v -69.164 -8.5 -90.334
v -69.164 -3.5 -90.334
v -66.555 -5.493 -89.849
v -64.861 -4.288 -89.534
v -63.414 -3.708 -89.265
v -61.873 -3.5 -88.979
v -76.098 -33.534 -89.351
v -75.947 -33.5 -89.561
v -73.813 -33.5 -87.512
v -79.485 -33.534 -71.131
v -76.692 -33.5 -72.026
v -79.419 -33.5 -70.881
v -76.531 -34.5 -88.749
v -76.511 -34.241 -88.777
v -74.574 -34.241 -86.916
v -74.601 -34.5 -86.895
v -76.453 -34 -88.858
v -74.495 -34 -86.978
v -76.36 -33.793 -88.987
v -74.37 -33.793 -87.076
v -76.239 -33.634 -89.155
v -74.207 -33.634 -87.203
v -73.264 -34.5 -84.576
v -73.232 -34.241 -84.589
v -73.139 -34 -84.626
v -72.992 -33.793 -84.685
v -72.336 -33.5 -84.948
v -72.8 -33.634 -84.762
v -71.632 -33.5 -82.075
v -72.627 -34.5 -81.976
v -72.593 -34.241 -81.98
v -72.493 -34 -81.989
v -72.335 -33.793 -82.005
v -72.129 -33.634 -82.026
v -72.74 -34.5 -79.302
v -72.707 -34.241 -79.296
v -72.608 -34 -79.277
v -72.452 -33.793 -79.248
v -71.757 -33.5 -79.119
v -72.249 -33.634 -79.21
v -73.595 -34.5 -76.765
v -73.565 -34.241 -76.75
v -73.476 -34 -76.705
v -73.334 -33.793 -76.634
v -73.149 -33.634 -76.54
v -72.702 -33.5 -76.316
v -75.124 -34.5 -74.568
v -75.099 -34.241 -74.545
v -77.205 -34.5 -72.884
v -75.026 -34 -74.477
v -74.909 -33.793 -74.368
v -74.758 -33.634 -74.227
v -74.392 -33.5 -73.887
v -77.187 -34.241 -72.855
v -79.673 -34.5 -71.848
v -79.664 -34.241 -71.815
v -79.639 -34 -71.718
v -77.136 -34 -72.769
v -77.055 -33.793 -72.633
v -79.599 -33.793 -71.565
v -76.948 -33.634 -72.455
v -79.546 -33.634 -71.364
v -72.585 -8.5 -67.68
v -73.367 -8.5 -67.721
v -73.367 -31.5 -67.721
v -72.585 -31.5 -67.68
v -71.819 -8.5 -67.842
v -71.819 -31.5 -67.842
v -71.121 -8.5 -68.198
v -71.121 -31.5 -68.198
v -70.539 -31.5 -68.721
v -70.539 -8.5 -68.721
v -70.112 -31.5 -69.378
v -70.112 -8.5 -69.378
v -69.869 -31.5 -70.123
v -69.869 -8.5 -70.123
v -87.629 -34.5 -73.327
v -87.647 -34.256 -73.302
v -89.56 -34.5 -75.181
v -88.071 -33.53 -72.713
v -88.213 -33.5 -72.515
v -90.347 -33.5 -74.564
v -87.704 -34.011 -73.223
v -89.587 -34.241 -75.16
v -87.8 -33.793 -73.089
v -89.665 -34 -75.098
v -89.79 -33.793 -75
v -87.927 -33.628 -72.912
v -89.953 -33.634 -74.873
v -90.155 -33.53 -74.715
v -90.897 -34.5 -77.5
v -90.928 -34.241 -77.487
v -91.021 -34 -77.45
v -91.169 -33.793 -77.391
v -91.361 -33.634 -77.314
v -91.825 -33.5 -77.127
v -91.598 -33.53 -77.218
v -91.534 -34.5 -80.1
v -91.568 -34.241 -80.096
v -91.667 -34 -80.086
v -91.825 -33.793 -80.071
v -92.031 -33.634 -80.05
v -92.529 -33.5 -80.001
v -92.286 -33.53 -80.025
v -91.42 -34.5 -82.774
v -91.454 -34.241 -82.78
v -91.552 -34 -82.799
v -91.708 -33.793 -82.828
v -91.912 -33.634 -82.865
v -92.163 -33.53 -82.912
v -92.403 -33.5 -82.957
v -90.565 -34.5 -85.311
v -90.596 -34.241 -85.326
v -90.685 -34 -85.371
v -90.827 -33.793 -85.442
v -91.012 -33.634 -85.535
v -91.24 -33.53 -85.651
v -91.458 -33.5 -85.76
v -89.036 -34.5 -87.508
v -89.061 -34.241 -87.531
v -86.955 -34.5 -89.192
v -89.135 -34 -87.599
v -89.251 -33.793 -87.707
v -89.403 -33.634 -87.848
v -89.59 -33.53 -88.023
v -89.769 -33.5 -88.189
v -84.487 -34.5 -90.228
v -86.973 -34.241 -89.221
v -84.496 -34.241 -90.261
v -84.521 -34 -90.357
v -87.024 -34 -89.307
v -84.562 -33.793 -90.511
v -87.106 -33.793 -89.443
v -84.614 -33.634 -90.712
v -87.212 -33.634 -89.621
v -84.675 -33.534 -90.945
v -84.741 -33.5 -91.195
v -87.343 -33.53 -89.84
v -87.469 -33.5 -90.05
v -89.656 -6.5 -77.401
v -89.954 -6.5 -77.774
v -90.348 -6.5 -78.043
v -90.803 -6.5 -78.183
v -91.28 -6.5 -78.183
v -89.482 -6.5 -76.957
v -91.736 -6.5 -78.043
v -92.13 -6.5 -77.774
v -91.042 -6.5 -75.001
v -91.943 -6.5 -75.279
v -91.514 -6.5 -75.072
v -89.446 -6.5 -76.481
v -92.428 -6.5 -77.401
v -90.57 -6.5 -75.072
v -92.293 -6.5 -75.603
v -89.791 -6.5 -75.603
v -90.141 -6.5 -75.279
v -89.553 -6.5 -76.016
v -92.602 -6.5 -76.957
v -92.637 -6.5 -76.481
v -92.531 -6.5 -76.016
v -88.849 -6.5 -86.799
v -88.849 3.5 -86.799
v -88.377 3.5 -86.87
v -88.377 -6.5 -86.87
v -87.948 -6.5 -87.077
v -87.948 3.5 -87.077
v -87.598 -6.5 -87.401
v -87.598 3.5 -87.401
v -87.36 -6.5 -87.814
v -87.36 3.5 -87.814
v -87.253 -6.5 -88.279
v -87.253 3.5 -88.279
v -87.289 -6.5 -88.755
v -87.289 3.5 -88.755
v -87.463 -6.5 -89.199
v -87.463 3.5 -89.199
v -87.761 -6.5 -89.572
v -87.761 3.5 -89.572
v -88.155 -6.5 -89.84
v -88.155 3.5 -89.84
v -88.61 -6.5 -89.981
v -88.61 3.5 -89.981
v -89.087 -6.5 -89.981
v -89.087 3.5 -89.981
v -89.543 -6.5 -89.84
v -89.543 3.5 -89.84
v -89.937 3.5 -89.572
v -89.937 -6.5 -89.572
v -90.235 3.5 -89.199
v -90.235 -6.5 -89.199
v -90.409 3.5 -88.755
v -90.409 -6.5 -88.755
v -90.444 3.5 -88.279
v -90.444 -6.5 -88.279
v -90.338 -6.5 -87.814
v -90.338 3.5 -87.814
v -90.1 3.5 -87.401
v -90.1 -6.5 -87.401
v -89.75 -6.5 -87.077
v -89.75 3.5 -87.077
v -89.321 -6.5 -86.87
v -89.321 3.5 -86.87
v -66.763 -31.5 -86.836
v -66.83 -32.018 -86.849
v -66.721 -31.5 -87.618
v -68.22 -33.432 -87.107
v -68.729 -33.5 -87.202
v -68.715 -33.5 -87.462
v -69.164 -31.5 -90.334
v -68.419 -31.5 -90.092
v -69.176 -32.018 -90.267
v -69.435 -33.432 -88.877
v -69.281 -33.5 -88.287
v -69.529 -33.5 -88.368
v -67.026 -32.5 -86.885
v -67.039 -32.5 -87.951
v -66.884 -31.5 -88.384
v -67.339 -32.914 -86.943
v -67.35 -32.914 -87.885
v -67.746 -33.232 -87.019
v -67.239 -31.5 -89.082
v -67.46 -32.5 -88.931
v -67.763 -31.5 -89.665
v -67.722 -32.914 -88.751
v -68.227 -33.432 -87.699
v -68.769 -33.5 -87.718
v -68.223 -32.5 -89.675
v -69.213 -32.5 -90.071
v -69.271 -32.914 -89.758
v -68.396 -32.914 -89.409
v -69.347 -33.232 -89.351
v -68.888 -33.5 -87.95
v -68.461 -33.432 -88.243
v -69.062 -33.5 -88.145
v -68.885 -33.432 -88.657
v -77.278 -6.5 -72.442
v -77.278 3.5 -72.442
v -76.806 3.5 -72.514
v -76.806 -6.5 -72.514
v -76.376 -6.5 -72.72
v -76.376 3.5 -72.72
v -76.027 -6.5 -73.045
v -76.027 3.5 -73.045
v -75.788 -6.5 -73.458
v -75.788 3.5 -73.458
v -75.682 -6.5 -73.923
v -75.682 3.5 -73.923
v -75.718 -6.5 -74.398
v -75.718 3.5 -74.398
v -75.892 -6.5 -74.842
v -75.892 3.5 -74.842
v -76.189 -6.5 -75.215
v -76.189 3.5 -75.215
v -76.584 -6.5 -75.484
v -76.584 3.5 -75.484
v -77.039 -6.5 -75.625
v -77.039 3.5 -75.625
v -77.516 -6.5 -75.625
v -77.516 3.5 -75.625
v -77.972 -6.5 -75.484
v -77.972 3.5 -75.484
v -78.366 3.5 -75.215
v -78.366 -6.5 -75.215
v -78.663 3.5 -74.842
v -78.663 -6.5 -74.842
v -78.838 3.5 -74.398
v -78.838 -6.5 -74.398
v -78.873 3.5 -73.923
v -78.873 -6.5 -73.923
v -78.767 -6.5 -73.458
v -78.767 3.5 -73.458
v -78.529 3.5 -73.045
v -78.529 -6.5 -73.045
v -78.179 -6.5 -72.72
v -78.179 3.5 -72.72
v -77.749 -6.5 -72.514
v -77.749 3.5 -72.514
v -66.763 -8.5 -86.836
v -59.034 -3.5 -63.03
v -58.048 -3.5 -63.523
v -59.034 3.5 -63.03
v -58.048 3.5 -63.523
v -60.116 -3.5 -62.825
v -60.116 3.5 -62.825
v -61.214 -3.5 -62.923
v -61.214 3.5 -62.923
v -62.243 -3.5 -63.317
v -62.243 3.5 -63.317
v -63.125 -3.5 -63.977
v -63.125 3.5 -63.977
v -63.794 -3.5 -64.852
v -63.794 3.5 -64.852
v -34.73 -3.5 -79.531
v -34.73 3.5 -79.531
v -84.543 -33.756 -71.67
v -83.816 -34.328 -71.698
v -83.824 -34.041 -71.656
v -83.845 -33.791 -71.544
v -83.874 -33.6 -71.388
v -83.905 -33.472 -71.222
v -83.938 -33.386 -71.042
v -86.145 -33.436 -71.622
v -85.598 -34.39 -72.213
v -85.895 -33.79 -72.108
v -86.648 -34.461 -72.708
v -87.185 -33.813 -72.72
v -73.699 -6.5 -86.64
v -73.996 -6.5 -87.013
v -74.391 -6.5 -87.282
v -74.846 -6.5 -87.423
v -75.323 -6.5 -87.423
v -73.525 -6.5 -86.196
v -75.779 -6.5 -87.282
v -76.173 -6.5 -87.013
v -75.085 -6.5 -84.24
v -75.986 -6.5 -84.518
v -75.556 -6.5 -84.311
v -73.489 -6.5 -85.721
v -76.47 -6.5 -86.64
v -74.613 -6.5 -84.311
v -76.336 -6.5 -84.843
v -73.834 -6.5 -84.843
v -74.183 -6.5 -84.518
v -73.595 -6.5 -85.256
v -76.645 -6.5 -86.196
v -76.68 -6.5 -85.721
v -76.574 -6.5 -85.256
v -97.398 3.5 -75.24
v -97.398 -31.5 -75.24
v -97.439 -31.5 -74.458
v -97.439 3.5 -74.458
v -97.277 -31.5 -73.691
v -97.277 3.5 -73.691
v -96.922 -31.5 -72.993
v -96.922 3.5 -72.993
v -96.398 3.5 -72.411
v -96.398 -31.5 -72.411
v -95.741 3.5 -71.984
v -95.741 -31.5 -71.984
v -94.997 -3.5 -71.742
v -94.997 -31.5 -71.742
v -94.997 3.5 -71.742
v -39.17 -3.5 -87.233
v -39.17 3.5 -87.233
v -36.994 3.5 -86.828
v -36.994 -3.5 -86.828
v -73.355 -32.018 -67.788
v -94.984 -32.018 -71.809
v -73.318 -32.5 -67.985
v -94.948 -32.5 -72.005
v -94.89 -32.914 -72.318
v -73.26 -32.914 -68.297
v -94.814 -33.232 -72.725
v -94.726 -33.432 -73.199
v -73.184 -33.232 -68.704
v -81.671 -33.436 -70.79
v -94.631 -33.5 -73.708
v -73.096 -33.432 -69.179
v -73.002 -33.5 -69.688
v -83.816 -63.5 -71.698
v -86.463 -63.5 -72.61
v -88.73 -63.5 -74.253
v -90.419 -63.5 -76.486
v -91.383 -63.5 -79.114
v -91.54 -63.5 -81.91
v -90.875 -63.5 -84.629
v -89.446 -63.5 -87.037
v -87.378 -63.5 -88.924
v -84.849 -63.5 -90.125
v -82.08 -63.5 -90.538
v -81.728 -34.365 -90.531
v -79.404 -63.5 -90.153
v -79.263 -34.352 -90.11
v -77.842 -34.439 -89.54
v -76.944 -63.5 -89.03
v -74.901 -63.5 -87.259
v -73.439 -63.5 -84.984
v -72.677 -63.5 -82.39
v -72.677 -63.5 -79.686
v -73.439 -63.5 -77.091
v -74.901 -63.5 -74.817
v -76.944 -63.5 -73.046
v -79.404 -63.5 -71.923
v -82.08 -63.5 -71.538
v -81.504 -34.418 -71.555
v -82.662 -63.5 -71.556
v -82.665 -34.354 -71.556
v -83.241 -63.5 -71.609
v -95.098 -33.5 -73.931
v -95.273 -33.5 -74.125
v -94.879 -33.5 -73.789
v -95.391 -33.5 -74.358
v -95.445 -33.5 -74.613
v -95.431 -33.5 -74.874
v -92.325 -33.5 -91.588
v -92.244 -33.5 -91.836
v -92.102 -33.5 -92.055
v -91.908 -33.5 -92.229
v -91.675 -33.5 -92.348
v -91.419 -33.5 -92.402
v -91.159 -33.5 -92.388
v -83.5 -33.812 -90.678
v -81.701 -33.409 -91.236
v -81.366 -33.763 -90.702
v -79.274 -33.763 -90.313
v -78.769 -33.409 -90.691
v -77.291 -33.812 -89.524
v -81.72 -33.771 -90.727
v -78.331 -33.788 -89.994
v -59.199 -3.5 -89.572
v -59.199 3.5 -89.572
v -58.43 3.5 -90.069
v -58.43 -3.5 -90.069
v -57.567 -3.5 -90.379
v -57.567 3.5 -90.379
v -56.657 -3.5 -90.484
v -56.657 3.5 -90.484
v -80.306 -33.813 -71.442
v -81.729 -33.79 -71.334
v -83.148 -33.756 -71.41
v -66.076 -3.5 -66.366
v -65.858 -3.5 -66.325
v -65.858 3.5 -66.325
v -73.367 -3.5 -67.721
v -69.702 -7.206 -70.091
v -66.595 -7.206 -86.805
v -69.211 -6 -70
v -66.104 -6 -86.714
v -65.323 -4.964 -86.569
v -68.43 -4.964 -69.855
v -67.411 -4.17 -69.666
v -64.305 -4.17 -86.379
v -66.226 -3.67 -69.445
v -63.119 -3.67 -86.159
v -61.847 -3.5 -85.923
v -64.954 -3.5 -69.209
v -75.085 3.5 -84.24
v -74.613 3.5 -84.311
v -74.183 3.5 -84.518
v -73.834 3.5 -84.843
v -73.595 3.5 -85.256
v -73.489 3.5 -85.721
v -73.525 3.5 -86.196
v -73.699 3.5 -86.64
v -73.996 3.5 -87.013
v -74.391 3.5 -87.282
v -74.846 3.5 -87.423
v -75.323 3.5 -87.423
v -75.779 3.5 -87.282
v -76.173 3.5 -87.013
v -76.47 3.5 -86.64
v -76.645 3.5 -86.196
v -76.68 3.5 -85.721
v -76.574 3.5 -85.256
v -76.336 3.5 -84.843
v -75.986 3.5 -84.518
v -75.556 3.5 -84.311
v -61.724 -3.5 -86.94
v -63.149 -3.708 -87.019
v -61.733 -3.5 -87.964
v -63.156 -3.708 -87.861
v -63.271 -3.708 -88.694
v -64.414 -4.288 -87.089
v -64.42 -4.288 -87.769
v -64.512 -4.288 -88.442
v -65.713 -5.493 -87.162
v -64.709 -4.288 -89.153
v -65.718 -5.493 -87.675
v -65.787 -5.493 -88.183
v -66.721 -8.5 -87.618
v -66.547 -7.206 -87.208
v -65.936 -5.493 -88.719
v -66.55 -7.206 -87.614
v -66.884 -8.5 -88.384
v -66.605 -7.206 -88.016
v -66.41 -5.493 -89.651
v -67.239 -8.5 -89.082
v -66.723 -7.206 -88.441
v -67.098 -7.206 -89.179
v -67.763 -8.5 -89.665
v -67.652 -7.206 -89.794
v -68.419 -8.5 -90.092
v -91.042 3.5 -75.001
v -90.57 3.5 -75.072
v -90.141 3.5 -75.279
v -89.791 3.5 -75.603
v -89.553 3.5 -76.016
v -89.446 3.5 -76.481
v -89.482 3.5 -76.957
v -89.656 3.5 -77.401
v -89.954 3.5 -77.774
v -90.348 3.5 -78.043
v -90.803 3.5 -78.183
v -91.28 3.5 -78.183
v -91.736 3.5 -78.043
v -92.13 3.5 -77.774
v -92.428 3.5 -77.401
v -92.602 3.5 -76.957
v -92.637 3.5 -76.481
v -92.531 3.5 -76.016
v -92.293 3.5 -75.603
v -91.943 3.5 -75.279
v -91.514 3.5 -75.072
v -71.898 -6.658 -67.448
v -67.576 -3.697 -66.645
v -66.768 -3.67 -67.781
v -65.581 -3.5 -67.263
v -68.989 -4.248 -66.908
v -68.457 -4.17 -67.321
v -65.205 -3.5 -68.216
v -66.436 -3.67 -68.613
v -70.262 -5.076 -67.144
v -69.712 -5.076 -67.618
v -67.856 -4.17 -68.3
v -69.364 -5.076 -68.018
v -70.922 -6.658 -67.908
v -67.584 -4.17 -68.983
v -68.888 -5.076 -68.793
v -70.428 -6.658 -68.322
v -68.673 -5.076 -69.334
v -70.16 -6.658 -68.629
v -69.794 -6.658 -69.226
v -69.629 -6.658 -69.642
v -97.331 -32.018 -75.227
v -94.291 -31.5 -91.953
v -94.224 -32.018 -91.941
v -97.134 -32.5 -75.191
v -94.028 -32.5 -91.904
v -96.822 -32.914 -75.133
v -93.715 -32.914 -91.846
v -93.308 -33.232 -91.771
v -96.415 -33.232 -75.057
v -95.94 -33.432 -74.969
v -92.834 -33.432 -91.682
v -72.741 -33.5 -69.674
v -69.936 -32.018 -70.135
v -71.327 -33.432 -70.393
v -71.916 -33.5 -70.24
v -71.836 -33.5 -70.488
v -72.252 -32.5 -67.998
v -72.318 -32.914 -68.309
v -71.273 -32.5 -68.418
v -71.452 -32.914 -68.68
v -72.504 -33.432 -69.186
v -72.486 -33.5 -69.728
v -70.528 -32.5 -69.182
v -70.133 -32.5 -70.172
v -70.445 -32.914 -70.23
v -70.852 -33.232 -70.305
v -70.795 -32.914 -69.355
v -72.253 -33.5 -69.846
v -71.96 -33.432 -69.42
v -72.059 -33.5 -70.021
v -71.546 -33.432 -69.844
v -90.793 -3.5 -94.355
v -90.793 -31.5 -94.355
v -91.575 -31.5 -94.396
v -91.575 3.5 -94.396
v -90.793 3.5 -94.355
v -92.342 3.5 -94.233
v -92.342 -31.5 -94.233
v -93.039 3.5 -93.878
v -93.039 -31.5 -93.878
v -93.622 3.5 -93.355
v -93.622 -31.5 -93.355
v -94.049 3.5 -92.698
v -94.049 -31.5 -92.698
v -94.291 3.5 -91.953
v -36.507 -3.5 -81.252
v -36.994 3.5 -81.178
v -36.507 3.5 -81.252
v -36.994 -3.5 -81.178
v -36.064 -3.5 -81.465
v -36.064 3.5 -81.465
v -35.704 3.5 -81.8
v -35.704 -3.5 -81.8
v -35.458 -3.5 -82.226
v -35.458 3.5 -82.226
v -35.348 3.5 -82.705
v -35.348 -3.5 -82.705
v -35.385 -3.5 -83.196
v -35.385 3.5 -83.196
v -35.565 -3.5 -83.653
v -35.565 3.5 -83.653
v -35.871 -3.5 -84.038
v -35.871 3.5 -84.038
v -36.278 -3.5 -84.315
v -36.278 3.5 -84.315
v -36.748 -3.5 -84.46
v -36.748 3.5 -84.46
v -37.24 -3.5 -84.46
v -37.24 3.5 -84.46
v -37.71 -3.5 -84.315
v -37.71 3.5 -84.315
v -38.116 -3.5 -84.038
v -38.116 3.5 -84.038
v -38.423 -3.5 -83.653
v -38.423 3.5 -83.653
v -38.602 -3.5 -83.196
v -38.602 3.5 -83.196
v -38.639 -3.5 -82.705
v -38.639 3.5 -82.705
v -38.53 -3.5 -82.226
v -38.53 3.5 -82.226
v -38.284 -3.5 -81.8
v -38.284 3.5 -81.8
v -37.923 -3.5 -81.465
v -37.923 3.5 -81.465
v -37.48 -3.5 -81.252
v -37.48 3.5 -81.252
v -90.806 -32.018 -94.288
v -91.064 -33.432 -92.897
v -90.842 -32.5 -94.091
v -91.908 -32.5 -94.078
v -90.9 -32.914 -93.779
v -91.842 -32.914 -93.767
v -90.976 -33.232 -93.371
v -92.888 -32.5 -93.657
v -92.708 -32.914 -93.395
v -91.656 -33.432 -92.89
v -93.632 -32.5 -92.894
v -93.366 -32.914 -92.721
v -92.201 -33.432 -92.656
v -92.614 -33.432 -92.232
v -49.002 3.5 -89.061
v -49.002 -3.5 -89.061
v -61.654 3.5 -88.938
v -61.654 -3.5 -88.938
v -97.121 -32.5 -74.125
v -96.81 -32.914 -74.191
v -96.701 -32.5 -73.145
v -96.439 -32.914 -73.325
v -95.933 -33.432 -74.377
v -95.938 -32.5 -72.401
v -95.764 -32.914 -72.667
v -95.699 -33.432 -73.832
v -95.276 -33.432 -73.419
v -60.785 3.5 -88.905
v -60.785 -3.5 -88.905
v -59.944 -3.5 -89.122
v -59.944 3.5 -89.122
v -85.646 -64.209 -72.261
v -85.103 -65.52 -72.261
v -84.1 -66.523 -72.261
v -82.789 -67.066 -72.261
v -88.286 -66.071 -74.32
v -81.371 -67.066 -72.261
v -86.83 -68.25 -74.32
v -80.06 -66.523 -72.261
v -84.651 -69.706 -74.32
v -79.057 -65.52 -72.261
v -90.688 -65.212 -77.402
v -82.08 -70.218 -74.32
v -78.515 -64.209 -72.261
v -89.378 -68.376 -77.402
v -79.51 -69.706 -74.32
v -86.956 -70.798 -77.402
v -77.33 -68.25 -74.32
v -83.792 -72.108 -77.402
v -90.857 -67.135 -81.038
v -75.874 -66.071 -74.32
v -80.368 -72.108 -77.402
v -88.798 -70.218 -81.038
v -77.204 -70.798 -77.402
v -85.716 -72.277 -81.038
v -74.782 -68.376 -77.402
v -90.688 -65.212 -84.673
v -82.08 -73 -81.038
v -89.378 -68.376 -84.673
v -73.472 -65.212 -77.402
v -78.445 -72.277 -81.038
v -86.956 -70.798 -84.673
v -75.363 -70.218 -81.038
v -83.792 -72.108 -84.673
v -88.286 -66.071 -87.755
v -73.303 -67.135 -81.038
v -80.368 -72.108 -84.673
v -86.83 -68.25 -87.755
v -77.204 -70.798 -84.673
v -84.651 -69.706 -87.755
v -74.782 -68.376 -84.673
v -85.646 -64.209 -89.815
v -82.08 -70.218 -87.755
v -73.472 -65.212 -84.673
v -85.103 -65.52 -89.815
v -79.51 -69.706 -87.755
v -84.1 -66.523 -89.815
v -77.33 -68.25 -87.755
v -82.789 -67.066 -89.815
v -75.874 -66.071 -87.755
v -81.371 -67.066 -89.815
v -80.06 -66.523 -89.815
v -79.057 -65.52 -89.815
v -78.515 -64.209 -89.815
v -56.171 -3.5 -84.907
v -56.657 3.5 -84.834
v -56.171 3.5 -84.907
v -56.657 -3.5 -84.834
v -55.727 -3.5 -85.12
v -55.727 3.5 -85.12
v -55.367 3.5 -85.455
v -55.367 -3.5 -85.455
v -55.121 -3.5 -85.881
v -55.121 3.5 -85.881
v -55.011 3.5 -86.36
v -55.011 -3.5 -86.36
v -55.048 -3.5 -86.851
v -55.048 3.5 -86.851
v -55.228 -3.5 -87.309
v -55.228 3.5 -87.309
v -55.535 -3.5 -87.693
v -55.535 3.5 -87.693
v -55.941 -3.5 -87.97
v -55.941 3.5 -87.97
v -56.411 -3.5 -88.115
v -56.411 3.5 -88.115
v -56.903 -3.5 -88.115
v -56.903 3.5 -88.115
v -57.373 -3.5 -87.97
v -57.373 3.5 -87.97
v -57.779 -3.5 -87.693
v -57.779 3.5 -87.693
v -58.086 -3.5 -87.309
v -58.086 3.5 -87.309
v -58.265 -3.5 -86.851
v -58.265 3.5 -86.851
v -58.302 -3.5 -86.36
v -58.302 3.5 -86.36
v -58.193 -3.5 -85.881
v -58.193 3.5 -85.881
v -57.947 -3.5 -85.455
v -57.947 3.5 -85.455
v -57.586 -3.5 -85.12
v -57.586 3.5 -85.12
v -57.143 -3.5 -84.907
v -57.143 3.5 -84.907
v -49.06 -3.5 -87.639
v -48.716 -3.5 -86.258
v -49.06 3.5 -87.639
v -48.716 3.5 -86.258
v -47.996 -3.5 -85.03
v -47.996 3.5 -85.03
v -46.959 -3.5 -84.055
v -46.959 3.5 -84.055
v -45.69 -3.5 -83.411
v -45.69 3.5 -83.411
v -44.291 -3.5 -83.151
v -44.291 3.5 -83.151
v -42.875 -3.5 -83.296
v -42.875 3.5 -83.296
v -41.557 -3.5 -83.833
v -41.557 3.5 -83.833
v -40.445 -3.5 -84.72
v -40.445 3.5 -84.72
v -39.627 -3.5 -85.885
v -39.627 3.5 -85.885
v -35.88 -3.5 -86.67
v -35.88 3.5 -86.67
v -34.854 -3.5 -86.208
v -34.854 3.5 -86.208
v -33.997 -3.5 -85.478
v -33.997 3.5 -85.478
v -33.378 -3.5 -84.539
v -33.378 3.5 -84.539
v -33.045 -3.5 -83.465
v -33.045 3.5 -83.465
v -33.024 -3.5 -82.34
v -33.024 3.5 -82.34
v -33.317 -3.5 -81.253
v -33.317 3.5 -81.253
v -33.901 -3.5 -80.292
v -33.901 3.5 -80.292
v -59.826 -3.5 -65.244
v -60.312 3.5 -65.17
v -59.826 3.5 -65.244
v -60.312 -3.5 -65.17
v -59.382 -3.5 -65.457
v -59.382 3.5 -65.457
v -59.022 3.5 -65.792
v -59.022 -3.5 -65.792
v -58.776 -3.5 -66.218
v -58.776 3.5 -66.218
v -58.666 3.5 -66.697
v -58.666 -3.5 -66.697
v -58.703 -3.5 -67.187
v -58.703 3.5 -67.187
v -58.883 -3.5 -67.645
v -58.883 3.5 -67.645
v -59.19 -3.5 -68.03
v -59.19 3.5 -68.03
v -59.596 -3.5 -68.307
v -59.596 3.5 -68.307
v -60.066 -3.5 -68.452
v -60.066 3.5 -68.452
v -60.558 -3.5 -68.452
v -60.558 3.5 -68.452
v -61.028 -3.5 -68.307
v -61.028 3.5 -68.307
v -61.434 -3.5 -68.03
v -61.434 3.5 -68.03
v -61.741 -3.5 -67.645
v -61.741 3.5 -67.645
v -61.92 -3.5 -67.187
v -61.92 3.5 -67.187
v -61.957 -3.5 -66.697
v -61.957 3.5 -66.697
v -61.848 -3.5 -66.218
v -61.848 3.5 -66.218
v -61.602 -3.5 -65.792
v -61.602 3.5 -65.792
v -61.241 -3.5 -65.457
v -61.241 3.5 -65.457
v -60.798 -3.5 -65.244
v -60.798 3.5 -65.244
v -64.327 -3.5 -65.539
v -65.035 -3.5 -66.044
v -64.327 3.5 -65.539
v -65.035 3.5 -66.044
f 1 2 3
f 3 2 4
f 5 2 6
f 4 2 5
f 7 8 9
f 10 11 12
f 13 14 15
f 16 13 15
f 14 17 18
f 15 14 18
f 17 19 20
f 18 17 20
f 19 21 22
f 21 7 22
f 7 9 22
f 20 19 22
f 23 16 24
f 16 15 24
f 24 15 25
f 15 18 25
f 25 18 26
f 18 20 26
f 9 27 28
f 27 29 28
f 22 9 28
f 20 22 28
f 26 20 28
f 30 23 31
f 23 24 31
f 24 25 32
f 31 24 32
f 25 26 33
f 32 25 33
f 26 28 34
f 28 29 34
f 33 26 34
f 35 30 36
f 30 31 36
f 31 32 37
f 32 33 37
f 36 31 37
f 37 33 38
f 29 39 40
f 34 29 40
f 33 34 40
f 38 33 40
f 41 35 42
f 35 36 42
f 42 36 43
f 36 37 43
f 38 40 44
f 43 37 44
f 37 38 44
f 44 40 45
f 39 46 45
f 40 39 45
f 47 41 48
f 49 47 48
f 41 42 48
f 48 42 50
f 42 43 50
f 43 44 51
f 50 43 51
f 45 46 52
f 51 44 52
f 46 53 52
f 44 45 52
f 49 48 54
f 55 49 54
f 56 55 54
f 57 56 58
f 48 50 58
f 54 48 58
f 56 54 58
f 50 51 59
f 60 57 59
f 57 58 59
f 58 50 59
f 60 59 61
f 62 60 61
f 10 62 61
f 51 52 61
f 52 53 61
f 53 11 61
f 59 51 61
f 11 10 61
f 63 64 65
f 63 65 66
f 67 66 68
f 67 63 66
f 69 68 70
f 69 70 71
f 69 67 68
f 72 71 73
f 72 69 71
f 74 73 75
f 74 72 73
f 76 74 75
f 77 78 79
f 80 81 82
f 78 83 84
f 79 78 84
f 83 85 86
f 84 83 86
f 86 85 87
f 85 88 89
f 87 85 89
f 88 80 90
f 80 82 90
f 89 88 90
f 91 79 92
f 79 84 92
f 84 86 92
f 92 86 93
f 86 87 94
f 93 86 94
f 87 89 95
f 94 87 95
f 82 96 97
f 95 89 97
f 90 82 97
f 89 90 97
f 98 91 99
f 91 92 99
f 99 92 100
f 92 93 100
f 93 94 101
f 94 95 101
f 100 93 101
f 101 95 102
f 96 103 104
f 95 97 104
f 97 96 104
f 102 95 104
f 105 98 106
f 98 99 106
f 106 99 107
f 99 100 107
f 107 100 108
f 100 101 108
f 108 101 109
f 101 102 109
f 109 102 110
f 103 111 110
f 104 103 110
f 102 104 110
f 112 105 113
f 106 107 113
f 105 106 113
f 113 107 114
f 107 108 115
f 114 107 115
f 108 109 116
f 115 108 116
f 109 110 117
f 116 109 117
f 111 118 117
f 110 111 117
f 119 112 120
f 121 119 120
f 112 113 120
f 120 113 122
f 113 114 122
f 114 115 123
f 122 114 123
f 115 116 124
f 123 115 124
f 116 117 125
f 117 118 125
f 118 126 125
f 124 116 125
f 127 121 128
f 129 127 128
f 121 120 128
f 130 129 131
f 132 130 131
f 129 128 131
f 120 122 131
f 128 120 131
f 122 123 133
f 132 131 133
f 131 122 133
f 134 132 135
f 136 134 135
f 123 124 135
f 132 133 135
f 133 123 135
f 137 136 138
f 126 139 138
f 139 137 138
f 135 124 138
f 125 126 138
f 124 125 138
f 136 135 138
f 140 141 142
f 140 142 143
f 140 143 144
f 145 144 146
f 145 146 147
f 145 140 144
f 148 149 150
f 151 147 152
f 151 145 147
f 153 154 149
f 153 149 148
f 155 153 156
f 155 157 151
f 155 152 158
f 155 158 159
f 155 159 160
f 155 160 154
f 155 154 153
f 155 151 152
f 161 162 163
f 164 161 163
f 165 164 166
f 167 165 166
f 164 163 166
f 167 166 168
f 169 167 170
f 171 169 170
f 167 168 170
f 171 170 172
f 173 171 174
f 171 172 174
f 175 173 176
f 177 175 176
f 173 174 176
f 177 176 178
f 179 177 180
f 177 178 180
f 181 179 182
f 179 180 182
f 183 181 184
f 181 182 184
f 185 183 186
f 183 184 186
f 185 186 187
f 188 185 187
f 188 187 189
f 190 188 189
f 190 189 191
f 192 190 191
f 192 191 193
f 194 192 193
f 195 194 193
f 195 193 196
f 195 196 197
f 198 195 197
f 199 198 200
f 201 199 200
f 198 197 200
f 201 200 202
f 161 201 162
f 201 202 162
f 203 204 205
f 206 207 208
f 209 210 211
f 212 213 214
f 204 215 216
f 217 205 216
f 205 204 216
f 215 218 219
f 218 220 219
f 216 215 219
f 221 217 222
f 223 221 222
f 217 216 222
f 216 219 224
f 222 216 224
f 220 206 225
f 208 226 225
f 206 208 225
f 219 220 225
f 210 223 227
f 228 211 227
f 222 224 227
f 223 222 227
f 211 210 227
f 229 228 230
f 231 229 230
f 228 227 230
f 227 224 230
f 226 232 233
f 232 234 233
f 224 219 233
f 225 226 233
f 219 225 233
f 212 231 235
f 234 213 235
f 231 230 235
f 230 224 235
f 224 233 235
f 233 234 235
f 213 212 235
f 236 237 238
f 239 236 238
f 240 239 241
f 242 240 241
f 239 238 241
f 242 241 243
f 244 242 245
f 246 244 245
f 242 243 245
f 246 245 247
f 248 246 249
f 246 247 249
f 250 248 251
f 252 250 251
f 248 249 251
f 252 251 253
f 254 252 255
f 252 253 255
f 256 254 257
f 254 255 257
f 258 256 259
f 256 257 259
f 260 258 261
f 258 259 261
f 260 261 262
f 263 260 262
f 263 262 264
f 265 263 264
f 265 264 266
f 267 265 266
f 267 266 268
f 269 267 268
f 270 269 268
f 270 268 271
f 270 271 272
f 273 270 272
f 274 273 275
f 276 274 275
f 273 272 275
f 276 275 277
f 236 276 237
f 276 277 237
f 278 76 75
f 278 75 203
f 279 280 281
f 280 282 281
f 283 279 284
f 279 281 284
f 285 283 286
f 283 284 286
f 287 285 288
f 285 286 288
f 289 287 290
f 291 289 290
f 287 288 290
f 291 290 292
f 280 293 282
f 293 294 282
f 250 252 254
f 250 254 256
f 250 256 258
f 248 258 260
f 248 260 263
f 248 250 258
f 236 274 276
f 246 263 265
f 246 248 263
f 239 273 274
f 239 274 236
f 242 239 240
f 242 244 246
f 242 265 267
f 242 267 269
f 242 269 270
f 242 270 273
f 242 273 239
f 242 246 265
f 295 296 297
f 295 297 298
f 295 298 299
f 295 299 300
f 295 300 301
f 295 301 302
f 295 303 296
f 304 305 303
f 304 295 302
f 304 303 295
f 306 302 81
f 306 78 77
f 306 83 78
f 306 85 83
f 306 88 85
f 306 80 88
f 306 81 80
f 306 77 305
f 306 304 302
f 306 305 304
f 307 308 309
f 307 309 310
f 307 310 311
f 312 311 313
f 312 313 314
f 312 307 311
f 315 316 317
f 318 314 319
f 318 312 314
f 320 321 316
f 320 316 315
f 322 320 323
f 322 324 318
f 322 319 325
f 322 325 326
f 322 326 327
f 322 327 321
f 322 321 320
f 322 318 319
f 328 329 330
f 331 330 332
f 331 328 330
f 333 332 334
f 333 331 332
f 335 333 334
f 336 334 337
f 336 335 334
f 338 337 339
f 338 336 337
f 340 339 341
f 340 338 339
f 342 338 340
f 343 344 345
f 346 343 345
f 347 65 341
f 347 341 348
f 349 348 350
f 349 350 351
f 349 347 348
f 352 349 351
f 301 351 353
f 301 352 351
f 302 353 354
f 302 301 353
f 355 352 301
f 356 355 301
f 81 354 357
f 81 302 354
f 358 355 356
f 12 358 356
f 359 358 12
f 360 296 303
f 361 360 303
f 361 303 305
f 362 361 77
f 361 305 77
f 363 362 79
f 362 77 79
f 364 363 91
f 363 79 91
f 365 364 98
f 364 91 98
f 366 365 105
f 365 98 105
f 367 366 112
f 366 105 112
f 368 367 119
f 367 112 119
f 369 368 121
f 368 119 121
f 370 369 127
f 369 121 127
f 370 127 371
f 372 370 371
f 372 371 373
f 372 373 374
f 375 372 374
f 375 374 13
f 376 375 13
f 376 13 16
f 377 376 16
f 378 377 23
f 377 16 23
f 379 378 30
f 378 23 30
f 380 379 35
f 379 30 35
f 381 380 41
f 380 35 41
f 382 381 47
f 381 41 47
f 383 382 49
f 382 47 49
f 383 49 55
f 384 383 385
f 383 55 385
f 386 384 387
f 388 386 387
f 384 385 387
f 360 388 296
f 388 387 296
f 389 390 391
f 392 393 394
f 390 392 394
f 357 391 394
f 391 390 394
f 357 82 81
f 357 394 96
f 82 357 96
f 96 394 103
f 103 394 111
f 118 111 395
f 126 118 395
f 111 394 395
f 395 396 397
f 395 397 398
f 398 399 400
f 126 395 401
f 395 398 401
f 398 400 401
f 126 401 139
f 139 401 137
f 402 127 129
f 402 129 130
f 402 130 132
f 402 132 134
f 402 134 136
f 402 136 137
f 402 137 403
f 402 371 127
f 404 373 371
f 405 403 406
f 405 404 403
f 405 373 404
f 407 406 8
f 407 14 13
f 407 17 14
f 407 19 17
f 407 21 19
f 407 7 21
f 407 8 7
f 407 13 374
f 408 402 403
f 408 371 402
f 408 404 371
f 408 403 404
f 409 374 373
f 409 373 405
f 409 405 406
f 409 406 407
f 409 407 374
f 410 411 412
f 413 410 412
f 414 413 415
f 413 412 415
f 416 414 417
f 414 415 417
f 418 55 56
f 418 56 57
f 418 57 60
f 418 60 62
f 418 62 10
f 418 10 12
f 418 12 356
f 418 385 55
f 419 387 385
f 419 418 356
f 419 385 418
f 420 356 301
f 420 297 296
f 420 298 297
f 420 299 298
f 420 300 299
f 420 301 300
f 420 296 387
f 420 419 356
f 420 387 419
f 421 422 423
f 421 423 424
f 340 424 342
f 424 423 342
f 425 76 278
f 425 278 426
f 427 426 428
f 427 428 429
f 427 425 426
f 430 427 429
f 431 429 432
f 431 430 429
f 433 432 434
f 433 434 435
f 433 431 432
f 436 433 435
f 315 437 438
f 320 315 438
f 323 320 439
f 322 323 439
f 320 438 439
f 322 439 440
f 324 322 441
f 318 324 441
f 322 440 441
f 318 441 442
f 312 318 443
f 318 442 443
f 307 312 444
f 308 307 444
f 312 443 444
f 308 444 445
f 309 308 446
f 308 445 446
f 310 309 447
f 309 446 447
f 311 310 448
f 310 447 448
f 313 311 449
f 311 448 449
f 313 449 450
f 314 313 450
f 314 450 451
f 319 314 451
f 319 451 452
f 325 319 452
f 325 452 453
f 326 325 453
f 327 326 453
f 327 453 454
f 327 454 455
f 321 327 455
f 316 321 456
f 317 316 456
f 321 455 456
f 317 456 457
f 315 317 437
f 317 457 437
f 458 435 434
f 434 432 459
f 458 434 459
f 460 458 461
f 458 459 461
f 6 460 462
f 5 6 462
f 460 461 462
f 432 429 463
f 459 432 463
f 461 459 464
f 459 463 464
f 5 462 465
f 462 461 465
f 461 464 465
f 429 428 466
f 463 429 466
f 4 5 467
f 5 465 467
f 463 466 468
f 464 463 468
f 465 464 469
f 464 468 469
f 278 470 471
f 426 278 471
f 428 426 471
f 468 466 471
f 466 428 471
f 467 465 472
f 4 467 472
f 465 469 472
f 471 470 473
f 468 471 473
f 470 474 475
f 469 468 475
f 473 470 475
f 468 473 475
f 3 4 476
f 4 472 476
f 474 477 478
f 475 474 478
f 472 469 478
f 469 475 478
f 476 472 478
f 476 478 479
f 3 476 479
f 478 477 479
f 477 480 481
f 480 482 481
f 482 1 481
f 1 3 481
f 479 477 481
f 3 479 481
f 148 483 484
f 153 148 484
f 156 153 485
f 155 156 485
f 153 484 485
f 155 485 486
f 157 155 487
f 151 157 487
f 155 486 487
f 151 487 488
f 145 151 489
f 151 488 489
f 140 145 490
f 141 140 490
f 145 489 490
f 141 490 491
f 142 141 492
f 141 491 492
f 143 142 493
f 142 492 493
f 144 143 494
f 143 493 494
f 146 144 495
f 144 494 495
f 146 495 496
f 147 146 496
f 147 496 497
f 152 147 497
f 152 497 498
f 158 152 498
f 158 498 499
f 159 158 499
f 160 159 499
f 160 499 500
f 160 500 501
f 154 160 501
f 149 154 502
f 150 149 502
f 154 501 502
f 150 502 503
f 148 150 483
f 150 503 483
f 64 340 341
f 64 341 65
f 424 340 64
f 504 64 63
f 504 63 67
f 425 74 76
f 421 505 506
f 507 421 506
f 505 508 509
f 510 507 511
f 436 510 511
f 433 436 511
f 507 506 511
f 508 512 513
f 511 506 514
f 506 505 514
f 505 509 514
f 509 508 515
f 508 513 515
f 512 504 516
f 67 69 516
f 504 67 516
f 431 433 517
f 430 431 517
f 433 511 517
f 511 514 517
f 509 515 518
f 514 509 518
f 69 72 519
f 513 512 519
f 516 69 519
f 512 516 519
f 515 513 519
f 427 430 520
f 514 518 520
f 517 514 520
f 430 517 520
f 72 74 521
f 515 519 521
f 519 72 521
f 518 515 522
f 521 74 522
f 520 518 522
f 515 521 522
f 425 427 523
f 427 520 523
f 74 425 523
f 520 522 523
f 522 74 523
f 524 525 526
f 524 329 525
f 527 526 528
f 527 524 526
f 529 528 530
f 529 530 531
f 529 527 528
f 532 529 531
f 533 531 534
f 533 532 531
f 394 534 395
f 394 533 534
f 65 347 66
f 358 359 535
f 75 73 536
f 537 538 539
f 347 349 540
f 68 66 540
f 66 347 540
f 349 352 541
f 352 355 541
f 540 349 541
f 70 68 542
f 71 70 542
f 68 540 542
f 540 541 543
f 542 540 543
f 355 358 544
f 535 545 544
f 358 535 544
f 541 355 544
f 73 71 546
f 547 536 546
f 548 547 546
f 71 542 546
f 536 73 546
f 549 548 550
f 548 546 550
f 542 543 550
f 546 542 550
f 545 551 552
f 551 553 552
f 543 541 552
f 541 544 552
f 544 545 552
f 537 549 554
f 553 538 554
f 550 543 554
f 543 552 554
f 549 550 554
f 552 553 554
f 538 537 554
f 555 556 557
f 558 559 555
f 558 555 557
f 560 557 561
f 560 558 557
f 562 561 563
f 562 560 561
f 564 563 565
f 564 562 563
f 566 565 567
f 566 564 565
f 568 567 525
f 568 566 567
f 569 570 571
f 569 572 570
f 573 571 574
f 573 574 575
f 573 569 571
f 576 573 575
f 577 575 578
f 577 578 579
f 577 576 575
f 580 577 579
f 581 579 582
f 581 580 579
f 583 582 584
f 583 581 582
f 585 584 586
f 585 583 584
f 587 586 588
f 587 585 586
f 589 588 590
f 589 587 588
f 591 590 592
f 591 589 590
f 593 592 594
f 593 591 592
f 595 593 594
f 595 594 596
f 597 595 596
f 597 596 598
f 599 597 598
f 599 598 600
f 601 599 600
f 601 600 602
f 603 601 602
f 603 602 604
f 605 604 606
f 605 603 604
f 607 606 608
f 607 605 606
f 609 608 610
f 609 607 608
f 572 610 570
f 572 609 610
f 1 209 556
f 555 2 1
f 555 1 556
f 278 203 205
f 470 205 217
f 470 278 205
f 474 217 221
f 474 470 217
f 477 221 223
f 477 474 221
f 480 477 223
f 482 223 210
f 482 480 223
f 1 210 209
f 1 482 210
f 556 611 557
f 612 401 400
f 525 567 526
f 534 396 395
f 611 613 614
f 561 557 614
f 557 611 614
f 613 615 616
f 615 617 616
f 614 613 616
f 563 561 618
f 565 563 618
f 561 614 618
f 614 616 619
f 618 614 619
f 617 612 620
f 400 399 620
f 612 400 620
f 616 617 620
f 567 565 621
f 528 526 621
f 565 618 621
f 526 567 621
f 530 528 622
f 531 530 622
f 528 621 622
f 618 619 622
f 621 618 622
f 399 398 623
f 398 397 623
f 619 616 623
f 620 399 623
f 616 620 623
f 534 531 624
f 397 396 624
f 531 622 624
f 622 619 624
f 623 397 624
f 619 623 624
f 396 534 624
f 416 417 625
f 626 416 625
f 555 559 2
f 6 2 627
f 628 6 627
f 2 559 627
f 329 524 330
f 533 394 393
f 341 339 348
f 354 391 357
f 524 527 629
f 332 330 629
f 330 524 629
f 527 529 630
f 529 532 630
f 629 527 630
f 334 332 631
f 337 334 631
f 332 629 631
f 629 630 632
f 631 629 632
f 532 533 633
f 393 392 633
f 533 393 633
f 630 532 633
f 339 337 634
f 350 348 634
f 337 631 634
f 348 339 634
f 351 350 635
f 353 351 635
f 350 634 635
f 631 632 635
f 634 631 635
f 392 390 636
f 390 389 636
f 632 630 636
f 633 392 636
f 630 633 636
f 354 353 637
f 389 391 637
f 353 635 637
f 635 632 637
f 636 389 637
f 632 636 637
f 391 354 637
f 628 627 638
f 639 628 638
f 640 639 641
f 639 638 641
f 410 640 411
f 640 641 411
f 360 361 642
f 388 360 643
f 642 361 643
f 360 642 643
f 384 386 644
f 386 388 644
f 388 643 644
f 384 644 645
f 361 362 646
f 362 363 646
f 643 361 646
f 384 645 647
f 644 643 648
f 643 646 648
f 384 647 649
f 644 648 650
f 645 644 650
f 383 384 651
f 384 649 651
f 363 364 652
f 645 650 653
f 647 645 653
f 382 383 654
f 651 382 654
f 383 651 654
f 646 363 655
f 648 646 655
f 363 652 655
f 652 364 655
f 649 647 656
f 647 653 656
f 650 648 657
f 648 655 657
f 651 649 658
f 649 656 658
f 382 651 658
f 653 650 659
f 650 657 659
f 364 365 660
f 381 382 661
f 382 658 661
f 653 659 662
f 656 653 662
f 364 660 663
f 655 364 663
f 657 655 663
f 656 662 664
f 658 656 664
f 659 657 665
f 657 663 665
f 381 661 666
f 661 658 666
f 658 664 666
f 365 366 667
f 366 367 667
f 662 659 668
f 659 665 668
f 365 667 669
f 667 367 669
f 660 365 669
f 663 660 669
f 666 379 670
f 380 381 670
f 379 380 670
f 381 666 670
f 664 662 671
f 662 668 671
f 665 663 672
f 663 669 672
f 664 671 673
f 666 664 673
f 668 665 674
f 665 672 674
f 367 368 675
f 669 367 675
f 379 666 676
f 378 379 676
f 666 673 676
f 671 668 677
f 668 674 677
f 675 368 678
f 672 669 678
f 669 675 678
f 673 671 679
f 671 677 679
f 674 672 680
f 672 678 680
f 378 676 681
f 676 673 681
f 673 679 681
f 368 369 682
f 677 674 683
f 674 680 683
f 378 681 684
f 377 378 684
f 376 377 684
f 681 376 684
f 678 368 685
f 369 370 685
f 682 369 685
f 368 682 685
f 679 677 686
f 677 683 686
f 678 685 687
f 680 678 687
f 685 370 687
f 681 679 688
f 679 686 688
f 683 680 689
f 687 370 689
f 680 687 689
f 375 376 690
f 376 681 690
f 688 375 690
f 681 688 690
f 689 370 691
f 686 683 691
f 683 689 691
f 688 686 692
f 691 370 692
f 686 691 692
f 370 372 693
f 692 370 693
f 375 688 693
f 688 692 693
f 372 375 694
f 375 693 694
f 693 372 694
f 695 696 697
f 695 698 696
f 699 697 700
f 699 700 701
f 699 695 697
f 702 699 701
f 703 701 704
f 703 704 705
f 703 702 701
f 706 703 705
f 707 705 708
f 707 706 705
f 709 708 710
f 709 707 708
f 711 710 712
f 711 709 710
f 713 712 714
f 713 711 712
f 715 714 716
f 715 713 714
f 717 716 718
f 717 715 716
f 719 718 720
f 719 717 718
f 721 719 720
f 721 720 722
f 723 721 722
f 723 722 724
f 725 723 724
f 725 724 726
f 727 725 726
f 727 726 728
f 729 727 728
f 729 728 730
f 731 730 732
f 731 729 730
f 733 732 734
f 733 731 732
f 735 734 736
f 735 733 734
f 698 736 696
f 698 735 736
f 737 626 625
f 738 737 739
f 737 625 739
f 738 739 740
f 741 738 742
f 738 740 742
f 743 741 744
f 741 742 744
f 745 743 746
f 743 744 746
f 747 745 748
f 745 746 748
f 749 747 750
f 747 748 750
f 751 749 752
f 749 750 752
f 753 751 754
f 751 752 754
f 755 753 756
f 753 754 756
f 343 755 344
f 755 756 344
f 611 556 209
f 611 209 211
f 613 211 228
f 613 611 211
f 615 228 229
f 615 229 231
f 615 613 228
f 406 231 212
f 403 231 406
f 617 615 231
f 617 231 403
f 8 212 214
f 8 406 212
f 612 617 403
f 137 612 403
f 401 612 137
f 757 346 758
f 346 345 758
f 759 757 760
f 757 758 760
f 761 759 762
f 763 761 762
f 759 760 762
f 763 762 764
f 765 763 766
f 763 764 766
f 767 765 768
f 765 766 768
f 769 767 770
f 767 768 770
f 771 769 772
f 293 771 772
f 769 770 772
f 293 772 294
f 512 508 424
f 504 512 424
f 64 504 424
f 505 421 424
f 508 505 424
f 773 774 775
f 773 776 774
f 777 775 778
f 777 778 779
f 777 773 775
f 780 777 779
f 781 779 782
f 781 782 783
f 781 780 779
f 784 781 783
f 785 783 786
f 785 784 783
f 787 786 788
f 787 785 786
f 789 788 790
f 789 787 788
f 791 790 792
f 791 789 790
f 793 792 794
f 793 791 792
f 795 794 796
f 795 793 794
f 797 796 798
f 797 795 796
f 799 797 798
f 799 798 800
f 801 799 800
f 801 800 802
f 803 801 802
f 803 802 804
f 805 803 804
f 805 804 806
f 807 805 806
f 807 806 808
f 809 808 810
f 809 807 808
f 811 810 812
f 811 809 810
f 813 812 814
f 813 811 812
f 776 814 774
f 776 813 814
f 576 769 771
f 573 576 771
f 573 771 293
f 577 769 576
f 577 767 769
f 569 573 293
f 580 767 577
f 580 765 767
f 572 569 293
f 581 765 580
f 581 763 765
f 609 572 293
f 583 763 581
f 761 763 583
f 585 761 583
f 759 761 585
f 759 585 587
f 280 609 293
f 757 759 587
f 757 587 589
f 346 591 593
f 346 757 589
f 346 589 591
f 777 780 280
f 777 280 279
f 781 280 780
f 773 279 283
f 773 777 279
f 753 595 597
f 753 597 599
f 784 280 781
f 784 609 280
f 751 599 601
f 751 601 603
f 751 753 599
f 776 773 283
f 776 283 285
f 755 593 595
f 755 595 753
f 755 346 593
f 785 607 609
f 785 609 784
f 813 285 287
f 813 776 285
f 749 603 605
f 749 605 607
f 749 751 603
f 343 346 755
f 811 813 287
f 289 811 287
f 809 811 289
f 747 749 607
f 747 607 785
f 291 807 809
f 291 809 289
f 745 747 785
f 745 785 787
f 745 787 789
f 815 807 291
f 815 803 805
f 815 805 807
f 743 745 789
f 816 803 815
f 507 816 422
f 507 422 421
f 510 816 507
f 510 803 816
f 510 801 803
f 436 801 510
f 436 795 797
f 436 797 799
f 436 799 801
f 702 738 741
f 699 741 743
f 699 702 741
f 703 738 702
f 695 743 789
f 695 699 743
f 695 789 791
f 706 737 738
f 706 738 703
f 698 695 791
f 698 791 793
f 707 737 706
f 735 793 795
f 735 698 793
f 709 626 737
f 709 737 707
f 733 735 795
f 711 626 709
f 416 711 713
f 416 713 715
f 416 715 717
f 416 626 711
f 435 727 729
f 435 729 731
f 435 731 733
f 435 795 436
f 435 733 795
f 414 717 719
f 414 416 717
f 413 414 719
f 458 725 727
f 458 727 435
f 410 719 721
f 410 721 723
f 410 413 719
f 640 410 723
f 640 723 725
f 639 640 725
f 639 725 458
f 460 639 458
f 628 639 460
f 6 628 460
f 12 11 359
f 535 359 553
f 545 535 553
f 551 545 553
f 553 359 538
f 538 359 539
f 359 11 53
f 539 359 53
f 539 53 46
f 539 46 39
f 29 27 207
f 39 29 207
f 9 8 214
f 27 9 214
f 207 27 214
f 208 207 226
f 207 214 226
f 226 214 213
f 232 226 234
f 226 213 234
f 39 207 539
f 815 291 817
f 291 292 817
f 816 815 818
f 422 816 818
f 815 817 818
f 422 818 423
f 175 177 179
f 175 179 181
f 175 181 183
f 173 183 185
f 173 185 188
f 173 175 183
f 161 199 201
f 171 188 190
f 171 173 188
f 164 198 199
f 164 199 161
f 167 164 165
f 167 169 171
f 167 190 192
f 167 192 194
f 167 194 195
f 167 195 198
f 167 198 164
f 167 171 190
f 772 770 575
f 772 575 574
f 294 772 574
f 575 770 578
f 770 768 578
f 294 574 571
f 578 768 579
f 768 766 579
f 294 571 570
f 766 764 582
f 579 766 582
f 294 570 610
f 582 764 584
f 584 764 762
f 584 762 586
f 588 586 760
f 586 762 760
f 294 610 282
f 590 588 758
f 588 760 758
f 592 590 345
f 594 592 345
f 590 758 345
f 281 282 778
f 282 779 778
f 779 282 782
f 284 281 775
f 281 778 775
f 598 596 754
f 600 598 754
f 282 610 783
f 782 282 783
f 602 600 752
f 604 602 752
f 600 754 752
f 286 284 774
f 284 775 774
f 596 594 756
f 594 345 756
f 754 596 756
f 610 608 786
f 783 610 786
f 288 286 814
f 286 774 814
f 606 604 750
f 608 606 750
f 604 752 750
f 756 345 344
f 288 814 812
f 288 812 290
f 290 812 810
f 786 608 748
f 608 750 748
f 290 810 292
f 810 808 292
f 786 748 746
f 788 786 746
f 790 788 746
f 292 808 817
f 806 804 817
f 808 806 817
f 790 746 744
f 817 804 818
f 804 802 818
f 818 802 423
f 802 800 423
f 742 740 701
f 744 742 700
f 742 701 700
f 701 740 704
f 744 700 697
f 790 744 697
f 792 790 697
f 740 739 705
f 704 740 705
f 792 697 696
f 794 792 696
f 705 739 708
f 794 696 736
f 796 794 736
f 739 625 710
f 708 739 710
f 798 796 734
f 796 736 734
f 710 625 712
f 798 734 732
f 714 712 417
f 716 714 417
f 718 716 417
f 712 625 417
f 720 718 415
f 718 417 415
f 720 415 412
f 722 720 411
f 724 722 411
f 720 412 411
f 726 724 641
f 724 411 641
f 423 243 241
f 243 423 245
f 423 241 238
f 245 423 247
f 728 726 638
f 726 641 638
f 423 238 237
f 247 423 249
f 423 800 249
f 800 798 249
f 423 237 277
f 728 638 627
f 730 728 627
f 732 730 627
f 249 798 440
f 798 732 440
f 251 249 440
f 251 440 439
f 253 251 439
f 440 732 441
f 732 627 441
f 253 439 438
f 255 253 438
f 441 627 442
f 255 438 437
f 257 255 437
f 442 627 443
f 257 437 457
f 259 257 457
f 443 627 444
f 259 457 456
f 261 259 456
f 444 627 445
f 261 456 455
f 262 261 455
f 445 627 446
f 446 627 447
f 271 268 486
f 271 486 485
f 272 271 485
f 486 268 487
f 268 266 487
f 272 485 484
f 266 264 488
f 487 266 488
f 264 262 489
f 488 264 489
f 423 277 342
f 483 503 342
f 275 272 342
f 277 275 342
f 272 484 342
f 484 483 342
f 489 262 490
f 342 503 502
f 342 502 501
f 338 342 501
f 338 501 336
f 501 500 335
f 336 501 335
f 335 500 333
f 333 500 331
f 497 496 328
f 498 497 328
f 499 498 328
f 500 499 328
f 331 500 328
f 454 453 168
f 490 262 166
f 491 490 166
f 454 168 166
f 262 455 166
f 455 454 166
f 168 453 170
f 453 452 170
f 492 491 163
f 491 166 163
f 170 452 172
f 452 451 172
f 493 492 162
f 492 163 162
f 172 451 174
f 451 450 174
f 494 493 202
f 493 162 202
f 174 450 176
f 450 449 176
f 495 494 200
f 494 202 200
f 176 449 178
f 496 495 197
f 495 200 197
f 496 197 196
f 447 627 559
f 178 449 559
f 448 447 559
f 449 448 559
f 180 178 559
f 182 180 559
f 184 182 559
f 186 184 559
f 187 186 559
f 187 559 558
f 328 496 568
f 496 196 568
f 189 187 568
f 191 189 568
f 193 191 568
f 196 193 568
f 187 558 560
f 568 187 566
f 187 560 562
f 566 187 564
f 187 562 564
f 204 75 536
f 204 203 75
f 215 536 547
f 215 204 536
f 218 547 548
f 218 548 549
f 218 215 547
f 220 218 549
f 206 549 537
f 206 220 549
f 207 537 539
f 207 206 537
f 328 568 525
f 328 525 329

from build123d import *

# Parameters (mm, degrees)
SKETCH1_R           = 1.650000007
BOSS_EXTRUDE1_DEPTH = 3.5
BOSS_EXTRUDE3_DEPTH = 30
FILLET1_R           = 5
FILLET2_R           = 2
SKETCH4_R           = 9.5
BOSS_EXTRUDE4_DEPTH = 30
FILLET3_R           = 1
REVOLVE1_ANGLE      = 180
SKETCH6_R           = 5
CUT_EXTRUDE1_DEPTH  = 10
SKETCH7_R           = 1.6
CUT_EXTRUDE2_DEPTH  = 10


with BuildPart() as part:
    # Sketch1 → Boss-Extrude1 (new, symmetric)
    with BuildSketch(Plane(origin=(0, 0, 0), x_dir=(1, 0, 0), z_dir=(0, 1, 0))):
        with BuildLine():
            Line((-56.656859897, 90.483506167), (-36.993673105, 86.828497938))
            ThreePointArc((-36.993673105, 86.828497938), (-33.173282872, 84.013663947), (-34.729774781, 79.530807173))
            Line((-34.729774781, 79.530807173), (-58.047969803, 63.522628609))
            ThreePointArc((-58.047969803, 63.522628609), (-61.213536363, 62.923269927), (-63.79414326, 64.852132418))
            ThreePointArc((-63.79414326, 64.852132418), (-64.662572796, 65.817505246), (-65.857598376, 66.32547022))
            Line((-65.857598376, 66.32547022), (-94.996570641, 71.741844715))
            ThreePointArc((-94.996570641, 71.741844715), (-96.92158748, 72.993398991), (-97.397797425, 75.239573968))
            Line((-97.397797425, 75.239573968), (-94.29104043, 91.953282742))
            ThreePointArc((-94.29104043, 91.953282742), (-93.039486154, 93.878299581), (-90.793311177, 94.354509526))
            Line((-90.793311177, 94.354509526), (-61.654338999, 88.938135048))
            ThreePointArc((-61.654338999, 88.938135048), (-60.356600681, 88.982743171), (-59.199275822, 89.571567253))
            ThreePointArc((-59.199275822, 89.571567253), (-58.007370108, 90.248625312), (-56.656859897, 90.483506167))
        make_face()
        with Locations(Location((-56.656859897, 86.483506167, 0), (0, 0, 270))):
            Circle(SKETCH1_R, mode=Mode.SUBTRACT)
        with Locations(Location((-36.993673105, 82.828497938, 0), (0, 0, 270))):
            Circle(SKETCH1_R, mode=Mode.SUBTRACT)
        with Locations(Location((-60.311868127, 66.820319374, 0), (0, 0, 270))):
            Circle(SKETCH1_R, mode=Mode.SUBTRACT)
    extrude(amount=BOSS_EXTRUDE1_DEPTH, both=True)

    # Sketch3 → Boss-Extrude3 (add)
    with BuildSketch(Plane(origin=(0, -3.5, 0), x_dir=(1, 0, 0), z_dir=(0, 1, 0))):
        with BuildLine():
            Line((-69.163805705, 90.334000474), (-90.793311177, 94.354509526))
            ThreePointArc((-90.793311177, 94.354509526), (-93.039486154, 93.878299581), (-94.29104043, 91.953282742))
            Line((-94.29104043, 91.953282742), (-97.397797425, 75.239573968))
            ThreePointArc((-97.397797425, 75.239573968), (-96.92158748, 72.993398991), (-94.996570641, 71.741844715))
            Line((-94.996570641, 71.741844715), (-73.367065169, 67.721335662))
            ThreePointArc((-73.367065169, 67.721335662), (-71.120890192, 68.197545608), (-69.869335915, 70.122562447))
            Line((-69.869335915, 70.122562447), (-66.762578921, 86.836271221))
            ThreePointArc((-66.762578921, 86.836271221), (-67.238788866, 89.082446198), (-69.163805705, 90.334000474))
        make_face()
    extrude(amount=-BOSS_EXTRUDE3_DEPTH)

    # Fillet1
    # the kernel refuses this fillet: 5 mm, written as the material it adds along each edge
    with BuildSketch(Plane(origin=(-72.818813934, -3.5, -70.670813681), x_dir=(0.9358033400655833, 0, -0.35252249392357676), z_dir=(0.35252249392357676, 0, 0.9358033400655833))) as fillet1_piece_1_section:
        with BuildLine():
            CenterArc((3 + FILLET1_R, -FILLET1_R), FILLET1_R, 90, 90)
            Line((3 + FILLET1_R, 0), (3, 0))
            Line((3, 0), (3, -FILLET1_R))
        make_face()
    fillet1_piece_1 = revolve(axis=Axis((-72.818813934, -3.5, -70.670813681), (0, 1, 0)), revolution_arc=328.828315396, mode=Mode.PRIVATE)
    fillet1_piece_1 = split(fillet1_piece_1, bisect_by=Plane(origin=(-73.367065169, -3.5, -67.721335662), z_dir=(0.18275041146570634, 0, -0.9831593396337722)), keep=Keep.TOP, mode=Mode.PRIVATE)
    add(fillet1_piece_1)
    with BuildSketch(Plane(origin=(-69.869335915, -3.5, -70.122562447), x_dir=(0, -1, 0), z_dir=(0.18275041146570747, 0, -0.9831593396337721))) as fillet1_piece_2:
        with BuildLine():
            CenterArc((FILLET1_R, -FILLET1_R), FILLET1_R, 90, 90)
            Line((0, -FILLET1_R), (0, 0))
            Line((0, 0), (FILLET1_R, 0))
        make_face()
    extrude(amount=17)
    with BuildSketch(Plane(origin=(-69.712056939, -3.5, -87.384522455), x_dir=(0.9831593396337688, 0, 0.18275041146572465), z_dir=(-0.18275041146572465, 0, 0.9831593396337688))) as fillet1_piece_3_section:
        with BuildLine():
            CenterArc((3 + FILLET1_R, -FILLET1_R), FILLET1_R, 90, 90)
            Line((3 + FILLET1_R, 0), (3, 0))
            Line((3, 0), (3, -FILLET1_R))
        make_face()
    fillet1_piece_3 = revolve(axis=Axis((-69.712056939, -3.5, -87.384522455), (0, 1, 0)), revolution_arc=328.828315396, mode=Mode.PRIVATE)
    fillet1_piece_3 = split(fillet1_piece_3, bisect_by=Plane(origin=(-69.163805705, -3.5, -90.334000474), z_dir=(-0.1827504114659838, 0, 0.9831593396337207)), keep=Keep.TOP, mode=Mode.PRIVATE)
    add(fillet1_piece_3)

    # Fillet2
    fillet2_edges = [part.edges().sort_by_distance(p)[0] for p in [
        (-71.120890192, -33.5, -68.197545608),
        (-84.181817905, -33.5, -69.731590188),
        (-96.92158748, -33.5, -72.993398991),
        (-95.844418928, -33.5, -83.596428355),
        (-93.039486154, -33.5, -93.878299581),
        (-79.978558441, -33.5, -92.344255),
        (-67.238788866, -33.5, -89.082446198),
        (-68.315957418, -33.5, -78.479416834),
    ]]
    fillet(fillet2_edges, radius=FILLET2_R)

    # Sketch4 → Boss-Extrude4 (add)
    with BuildSketch(Plane(origin=(0, -33.5, 0), x_dir=(-1, 0, 0), z_dir=(0, -1, 0))):
        with Locations(Location((82.080188173, 81.037922594, 0), (0, 0, 280.530004657))):
            Circle(SKETCH4_R)
    extrude(amount=BOSS_EXTRUDE4_DEPTH)

    # Fillet3
    fillet3_edges = [part.edges().sort_by_distance(p)[0] for p in [
        (-72.740174433, -33.5, -79.301793759),
        (-91.420201913, -33.5, -82.77405143),
    ]]
    fillet(fillet3_edges, radius=FILLET3_R)

    # Sketch5 → Revolve1 (revolve)
    with BuildSketch(Plane(origin=(0, -63.5, 0), x_dir=(-1, 0, 0), z_dir=(0, -1, 0))):
        with BuildLine():
            Line((82.080188173, 90.537922594), (82.080188173, 71.537922594))
            ThreePointArc((82.080188173, 71.537922594), (91.580188173, 81.037922594), (82.080188173, 90.537922594))
        make_face()
    revolve(axis=Axis((-82.080188173, -63.5, -90.537922594), (0, 0, 1)), revolution_arc=REVOLVE1_ANGLE)

    # Sketch6 → Cut-Extrude1 (cut)
    with BuildSketch(Plane(origin=(0, 3.5, 0), x_dir=(1, 0, 0), z_dir=(0, 1, 0))):
        with Locations((-44.086083588, 88.146840634)):
            Circle(SKETCH6_R)
    extrude(amount=-CUT_EXTRUDE1_DEPTH, mode=Mode.SUBTRACT)

    # Sketch7 → Cut-Extrude2 (cut)
    with BuildSketch(Plane(origin=(0, 3.5, 0), x_dir=(1, 0, 0), z_dir=(0, 1, 0))):
        with Locations(Location((-88.848960421, 88.398881924, 0), (0, 0, 270))):
            Circle(SKETCH7_R)
        with Locations(Location((-91.041965359, 76.600969848, 0), (0, 0, 270))):
            Circle(SKETCH7_R)
        with Locations(Location((-75.084729666, 85.840376163, 0), (0, 0, 270))):
            Circle(SKETCH7_R)
        with Locations(Location((-77.277734604, 74.042464088, 0), (0, 0, 270))):
            Circle(SKETCH7_R)
    extrude(amount=-CUT_EXTRUDE2_DEPTH, mode=Mode.SUBTRACT)


solid = part.part
